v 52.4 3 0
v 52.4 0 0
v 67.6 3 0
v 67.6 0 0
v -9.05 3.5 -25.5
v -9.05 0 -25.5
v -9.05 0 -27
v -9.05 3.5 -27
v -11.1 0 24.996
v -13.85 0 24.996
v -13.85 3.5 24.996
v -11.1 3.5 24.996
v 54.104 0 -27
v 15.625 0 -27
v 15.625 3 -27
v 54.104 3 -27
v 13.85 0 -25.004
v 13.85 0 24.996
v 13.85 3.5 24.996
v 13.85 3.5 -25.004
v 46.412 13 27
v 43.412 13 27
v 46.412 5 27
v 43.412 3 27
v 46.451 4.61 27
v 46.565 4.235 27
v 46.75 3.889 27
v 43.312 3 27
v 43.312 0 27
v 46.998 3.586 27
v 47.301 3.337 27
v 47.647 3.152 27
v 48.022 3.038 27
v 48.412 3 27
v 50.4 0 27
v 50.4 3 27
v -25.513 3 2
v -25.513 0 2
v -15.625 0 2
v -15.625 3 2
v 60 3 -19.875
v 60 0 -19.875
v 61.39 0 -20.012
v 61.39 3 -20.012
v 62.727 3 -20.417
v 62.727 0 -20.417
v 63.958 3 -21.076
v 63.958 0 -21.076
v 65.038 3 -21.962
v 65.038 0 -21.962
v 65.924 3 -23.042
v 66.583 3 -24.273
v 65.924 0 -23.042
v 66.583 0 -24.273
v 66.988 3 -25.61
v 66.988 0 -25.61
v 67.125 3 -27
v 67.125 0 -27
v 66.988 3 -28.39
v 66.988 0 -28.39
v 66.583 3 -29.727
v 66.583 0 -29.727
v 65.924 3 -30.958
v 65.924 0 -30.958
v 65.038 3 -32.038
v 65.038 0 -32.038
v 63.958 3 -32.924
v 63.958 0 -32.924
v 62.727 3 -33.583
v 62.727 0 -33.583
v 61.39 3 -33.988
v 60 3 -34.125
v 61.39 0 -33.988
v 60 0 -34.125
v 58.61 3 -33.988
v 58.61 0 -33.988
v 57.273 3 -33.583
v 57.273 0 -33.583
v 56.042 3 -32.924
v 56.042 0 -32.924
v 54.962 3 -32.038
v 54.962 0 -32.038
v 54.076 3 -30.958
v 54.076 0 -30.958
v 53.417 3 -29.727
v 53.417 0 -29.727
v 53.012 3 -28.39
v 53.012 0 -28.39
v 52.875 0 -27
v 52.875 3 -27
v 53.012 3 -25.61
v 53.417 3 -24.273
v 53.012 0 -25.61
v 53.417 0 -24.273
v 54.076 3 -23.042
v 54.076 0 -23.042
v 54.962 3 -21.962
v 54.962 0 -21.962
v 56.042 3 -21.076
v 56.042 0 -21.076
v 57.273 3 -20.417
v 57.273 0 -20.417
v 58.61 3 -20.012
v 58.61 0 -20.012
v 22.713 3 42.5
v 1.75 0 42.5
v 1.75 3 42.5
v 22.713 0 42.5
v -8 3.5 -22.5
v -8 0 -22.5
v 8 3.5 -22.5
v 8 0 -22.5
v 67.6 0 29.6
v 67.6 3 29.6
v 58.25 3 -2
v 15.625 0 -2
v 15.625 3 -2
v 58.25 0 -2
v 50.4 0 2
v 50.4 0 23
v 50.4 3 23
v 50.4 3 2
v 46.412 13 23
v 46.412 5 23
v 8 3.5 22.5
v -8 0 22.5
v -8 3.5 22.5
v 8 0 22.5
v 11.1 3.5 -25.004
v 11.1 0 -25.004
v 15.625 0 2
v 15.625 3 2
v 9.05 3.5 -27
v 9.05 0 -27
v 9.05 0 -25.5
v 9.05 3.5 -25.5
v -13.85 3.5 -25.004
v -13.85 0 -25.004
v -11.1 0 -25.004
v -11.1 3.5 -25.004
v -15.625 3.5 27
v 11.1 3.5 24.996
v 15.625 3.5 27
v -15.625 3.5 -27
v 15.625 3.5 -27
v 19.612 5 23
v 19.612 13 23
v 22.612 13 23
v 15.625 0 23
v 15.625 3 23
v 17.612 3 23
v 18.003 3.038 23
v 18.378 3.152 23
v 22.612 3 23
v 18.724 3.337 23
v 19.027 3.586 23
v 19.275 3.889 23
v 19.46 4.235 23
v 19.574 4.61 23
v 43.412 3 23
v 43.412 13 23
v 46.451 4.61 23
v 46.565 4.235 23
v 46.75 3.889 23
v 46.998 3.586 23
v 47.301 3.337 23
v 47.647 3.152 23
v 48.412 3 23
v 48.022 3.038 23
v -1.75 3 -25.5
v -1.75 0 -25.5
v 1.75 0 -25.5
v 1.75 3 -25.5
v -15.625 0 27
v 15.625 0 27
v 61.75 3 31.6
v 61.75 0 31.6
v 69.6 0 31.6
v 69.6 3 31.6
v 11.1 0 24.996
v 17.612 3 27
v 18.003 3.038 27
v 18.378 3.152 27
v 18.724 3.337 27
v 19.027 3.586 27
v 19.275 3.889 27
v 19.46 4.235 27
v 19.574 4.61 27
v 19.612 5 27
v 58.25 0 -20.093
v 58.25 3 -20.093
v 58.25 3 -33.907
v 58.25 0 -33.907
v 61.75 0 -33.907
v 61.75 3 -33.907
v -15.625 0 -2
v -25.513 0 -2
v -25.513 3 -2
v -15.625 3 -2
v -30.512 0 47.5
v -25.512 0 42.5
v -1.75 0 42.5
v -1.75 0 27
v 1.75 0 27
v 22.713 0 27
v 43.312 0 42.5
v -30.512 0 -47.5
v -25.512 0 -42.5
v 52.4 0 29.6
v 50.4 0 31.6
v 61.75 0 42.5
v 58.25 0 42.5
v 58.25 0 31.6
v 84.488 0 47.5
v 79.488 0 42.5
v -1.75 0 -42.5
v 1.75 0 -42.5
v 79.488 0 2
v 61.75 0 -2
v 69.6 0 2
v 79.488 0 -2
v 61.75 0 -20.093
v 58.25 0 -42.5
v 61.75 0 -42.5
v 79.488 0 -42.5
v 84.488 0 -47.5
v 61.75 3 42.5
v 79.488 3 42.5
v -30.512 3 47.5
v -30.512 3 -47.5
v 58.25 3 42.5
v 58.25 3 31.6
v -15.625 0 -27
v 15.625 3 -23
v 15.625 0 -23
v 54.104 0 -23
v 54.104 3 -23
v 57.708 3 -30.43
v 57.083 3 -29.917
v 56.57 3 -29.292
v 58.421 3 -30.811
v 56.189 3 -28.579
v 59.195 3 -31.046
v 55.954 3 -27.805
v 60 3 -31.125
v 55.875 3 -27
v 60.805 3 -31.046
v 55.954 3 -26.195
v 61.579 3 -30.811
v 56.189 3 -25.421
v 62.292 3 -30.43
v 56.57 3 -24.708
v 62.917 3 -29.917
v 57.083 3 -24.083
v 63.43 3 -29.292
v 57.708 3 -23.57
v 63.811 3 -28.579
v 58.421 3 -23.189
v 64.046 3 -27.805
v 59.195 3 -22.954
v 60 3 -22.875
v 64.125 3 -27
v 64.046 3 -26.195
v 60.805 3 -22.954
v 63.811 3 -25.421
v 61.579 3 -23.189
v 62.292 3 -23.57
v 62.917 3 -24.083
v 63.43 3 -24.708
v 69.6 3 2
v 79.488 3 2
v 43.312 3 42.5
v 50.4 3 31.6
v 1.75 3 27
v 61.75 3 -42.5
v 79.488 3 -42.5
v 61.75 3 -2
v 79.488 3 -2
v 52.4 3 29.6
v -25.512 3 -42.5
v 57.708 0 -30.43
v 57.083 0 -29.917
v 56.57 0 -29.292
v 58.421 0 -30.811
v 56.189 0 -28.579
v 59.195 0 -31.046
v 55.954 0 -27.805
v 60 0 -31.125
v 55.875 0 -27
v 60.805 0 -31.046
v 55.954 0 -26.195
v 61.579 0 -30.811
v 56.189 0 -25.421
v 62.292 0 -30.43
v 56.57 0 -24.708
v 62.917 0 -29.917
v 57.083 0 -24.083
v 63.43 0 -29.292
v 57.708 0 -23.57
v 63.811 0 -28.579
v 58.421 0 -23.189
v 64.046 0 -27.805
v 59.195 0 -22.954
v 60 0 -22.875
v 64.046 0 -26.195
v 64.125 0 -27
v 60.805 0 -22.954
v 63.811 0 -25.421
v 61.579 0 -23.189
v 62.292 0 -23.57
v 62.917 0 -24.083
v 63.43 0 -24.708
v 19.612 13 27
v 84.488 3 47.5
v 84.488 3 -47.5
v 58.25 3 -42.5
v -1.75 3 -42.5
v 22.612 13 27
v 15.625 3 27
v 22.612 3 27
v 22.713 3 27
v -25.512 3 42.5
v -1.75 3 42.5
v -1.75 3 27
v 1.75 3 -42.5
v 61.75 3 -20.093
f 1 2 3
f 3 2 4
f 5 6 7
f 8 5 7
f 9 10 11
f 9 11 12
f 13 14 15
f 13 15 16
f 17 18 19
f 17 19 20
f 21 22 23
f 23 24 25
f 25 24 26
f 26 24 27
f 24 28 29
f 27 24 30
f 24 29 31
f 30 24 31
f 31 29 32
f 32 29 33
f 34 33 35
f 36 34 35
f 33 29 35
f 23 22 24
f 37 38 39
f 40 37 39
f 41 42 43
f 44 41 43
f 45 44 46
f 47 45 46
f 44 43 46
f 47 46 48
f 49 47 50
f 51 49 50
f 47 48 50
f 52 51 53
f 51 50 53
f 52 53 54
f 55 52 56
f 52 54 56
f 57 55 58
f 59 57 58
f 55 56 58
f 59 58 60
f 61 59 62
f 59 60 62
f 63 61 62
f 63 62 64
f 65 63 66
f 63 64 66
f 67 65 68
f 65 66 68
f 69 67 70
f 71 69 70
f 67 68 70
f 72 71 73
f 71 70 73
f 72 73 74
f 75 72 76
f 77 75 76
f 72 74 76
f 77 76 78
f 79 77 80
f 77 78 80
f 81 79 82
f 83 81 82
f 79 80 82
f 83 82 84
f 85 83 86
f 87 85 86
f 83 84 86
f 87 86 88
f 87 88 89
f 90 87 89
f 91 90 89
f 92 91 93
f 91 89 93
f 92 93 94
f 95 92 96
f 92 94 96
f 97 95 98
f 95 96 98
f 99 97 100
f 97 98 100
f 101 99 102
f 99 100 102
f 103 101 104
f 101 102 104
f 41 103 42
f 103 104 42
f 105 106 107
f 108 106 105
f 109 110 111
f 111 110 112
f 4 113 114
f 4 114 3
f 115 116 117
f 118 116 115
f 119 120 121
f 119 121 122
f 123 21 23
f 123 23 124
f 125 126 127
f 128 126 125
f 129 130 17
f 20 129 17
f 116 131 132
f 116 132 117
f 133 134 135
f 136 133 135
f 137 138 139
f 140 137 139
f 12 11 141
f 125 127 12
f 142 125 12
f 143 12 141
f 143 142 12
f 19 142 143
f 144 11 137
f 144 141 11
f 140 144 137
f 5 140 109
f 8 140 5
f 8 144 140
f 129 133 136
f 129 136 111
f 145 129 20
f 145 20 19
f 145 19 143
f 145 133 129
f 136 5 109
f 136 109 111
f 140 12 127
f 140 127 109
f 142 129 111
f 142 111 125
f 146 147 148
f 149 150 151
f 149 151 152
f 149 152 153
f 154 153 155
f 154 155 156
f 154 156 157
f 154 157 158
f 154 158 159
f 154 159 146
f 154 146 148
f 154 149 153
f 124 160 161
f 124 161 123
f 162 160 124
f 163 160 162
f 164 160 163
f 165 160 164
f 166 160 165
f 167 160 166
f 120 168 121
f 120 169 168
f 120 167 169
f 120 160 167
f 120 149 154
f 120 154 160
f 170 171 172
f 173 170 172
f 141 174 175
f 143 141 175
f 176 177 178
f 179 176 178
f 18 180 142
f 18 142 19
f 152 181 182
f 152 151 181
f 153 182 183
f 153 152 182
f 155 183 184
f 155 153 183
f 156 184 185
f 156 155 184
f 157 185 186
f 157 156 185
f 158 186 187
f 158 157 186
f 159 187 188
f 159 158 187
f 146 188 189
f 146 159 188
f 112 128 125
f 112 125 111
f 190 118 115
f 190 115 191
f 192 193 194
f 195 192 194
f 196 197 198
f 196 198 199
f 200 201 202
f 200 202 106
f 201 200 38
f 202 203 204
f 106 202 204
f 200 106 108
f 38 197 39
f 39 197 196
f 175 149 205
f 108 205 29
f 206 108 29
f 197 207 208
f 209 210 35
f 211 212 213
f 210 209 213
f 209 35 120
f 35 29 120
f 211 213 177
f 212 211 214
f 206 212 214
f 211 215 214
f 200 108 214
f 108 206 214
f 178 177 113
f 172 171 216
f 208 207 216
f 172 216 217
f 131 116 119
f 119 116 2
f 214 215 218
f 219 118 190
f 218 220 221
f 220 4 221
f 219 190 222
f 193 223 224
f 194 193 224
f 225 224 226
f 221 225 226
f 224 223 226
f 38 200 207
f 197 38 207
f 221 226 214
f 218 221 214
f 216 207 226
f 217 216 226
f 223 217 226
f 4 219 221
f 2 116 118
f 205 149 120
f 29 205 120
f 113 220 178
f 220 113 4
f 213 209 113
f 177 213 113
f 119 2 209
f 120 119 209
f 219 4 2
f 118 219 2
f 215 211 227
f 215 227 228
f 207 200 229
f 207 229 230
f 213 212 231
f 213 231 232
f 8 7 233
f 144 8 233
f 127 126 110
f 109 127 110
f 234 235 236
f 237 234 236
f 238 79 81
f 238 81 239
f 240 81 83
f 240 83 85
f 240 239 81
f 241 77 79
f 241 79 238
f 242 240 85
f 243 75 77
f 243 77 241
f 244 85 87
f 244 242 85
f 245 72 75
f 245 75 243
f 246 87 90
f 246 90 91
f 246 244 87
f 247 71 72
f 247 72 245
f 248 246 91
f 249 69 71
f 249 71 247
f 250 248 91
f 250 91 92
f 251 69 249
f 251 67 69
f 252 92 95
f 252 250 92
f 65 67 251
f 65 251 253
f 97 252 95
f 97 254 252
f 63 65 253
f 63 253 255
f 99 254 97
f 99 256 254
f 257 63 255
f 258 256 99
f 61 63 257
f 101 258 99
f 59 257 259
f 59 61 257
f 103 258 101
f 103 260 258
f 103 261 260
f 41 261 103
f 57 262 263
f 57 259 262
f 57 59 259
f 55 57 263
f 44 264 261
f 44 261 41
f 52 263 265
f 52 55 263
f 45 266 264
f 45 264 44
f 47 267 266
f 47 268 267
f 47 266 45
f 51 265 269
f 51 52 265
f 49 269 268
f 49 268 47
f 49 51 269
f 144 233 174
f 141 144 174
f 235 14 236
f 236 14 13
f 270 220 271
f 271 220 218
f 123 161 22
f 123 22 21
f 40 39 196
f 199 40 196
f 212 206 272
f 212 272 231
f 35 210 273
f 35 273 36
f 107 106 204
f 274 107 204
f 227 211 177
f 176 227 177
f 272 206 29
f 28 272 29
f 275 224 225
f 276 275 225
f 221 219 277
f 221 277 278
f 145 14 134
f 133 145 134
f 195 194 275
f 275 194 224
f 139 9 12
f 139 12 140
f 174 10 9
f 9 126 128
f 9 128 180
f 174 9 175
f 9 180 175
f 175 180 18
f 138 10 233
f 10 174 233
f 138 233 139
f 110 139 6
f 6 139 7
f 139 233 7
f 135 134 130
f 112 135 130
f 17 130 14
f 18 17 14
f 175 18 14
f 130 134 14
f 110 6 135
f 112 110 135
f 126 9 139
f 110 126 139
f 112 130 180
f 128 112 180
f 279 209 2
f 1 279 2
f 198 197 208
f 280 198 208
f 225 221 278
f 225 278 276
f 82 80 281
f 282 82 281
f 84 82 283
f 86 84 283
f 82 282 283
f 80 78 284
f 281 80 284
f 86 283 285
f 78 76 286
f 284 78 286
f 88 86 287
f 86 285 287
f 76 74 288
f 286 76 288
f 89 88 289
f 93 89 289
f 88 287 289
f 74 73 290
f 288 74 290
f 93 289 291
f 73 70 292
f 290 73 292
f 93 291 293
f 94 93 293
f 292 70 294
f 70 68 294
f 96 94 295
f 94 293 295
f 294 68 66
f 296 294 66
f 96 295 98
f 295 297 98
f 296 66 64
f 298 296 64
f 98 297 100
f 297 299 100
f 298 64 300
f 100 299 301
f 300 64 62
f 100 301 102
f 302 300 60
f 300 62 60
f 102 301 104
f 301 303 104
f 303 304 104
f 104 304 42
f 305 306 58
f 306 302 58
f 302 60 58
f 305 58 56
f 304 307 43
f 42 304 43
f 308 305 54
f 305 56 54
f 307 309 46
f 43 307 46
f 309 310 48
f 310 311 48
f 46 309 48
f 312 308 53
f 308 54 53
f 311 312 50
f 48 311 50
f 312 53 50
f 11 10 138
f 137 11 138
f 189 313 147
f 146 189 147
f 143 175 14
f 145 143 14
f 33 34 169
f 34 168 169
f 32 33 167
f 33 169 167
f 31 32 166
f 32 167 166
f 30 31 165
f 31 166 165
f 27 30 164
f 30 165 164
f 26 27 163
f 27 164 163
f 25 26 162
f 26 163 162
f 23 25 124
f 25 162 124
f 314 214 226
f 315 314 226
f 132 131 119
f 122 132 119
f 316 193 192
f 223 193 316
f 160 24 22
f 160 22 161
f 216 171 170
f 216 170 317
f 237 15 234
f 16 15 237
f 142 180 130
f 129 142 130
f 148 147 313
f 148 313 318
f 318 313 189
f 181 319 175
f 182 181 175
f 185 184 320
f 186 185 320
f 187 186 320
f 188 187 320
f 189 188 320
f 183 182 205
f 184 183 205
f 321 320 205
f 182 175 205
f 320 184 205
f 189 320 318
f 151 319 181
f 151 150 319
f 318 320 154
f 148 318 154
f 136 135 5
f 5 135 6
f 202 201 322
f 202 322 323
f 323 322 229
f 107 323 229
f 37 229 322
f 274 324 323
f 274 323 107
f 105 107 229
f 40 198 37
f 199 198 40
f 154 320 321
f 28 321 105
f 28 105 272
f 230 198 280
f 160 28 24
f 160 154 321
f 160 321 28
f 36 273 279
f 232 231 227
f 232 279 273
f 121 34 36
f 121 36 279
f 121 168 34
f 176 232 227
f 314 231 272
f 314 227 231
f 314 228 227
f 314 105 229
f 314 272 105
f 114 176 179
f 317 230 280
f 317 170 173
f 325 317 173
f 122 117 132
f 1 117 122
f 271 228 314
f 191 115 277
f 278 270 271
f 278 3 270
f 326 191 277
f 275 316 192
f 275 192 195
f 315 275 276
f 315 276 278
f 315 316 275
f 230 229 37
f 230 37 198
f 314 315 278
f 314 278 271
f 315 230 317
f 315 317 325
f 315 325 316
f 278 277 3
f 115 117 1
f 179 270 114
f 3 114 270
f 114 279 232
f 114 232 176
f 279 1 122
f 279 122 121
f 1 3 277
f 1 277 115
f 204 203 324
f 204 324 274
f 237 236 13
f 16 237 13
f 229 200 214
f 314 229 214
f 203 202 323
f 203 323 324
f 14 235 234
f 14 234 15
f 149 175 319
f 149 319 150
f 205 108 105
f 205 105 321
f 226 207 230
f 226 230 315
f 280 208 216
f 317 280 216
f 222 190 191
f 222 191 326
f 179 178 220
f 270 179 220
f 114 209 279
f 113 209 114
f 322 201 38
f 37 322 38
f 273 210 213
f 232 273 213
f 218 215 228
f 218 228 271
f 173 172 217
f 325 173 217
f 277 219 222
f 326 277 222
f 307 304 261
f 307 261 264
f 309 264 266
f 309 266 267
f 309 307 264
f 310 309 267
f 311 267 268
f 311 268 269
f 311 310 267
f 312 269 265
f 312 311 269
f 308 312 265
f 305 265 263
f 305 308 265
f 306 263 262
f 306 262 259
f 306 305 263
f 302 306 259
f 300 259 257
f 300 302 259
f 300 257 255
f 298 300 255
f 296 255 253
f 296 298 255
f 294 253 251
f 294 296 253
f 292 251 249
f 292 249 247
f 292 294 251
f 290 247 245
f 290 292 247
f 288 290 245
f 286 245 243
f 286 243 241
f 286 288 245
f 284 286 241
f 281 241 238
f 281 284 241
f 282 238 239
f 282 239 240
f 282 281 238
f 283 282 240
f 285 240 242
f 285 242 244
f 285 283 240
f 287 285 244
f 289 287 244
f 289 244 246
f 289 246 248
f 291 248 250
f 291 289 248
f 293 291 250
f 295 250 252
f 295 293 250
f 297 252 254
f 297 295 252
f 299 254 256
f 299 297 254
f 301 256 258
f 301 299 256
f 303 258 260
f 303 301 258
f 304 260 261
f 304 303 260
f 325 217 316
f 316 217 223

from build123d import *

# Parameters (mm, degrees)
SKETCH2_W           = 16
SKETCH2_H           = 45
SKETCH2_W_2         = 2.75
SKETCH2_H_2         = 50
BOSS_EXTRUDE1_DEPTH = 3.5
SKETCH3_W           = 19.2
SKETCH3_H           = 33.6
SKETCH3_W_2         = 15.2
SKETCH3_H_2         = 29.6
BOSS_EXTRUDE3_DEPTH = 3
SKETCH5_R           = 7.125
SKETCH5_R_2         = 4.125
BOSS_EXTRUDE5_DEPTH = 3
SKETCH4_W           = 115
SKETCH4_H           = 95
SKETCH4_W_2         = 110
SKETCH4_H_2         = 90
SKETCH4_W_3         = 105
SKETCH4_H_3         = 85
SKETCH4_W_4         = 3.5
SKETCH4_H_4         = 17
SKETCH4_W_5         = 9.8875
SKETCH4_H_5         = 4
SKETCH4_W_6         = 34.775
SKETCH4_H_6         = 15.5
SKETCH4_H_7         = 18.093255108
SKETCH4_H_8         = 8.593255108
SKETCH4_H_9         = 10.9
SKETCH4_W_7         = 38.478761792
SKETCH4_W_8         = 20.6
BOSS_EXTRUDE4_DEPTH = 3
SKETCH7_W           = 3
SKETCH7_H           = 4
BOSS_EXTRUDE6_DEPTH = 10
FILLET1_R           = 2
FILLET2_R           = 2


with BuildPart() as part:
    # Sketch2 → Boss-Extrude1 (new body)
    with BuildSketch(Plane(origin=(0, 0, 0), x_dir=(1, 0, 0), z_dir=(0, 1, 0))):
        Polygon((-15.625, -27), (15.625, -27), (15.625, 27), (9.05, 27), (9.05, 25.5), (-9.05, 25.5), (-9.05, 27), (-15.625, 27), align=None)
        Rectangle(SKETCH2_W, SKETCH2_H, mode=Mode.SUBTRACT)
        with Locations((12.475, 0.003539823)):
            Rectangle(SKETCH2_W_2, SKETCH2_H_2, mode=Mode.SUBTRACT)
        with Locations((-12.475, 0.003539823)):
            Rectangle(SKETCH2_W_2, SKETCH2_H_2, mode=Mode.SUBTRACT)
    extrude(amount=BOSS_EXTRUDE1_DEPTH)


with BuildPart() as body_2:
    # Sketch3 → Boss-Extrude3 (new body)
    with BuildSketch(Plane(origin=(0, 0, 0), x_dir=(1, 0, 0), z_dir=(0, 1, 0))):
        with Locations((60, -14.8)):
            Rectangle(SKETCH3_W, SKETCH3_H)
        with Locations((60, -14.8)):
            Rectangle(SKETCH3_W_2, SKETCH3_H_2, mode=Mode.SUBTRACT)
    extrude(amount=BOSS_EXTRUDE3_DEPTH)

    # Sketch4 → Boss-Extrude4 (add)
    # profile 1 of 13: a face of its own
    with BuildSketch(Plane(origin=(0, 0, 0), x_dir=(1, 0, 0), z_dir=(0, 1, 0))):
        with Locations((26.9875, 0)):
            Rectangle(SKETCH4_W, SKETCH4_H)
        with Locations((26.9875, 0)):
            Rectangle(SKETCH4_W_2, SKETCH4_H_2, mode=Mode.SUBTRACT)
    # profile 2 of 13: a face of its own
    with BuildSketch(Plane(origin=(0, 0, 0), x_dir=(1, 0, 0), z_dir=(0, 1, 0))):
        with Locations((26.9875, 0)):
            Rectangle(SKETCH4_W_2, SKETCH4_H_2)
        with Locations((26.9875, 0)):
            Rectangle(SKETCH4_W_3, SKETCH4_H_3, mode=Mode.SUBTRACT)
    # profile 3 of 13: a face of its own
    with BuildSketch(Plane(origin=(0, 0, 0), x_dir=(1, 0, 0), z_dir=(0, 1, 0))):
        with Locations((0, 34)):
            Rectangle(SKETCH4_W_4, SKETCH4_H_4)
    # profile 4 of 13: a face of its own
    with BuildSketch(Plane(origin=(0, 0, 0), x_dir=(1, 0, 0), z_dir=(0, 1, 0))):
        with Locations((-20.56875, 0)):
            Rectangle(SKETCH4_W_5, SKETCH4_H_5)
    # profile 5 of 13: a face of its own
    with BuildSketch(Plane(origin=(0, 0, 0), x_dir=(1, 0, 0), z_dir=(0, 1, 0))):
        with Locations((33.0125, 0)):
            Rectangle(SKETCH4_W_6, SKETCH4_H_5)
    # profile 6 of 13: a face of its own
    with BuildSketch(Plane(origin=(0, 0, 0), x_dir=(1, 0, 0), z_dir=(0, 1, 0))):
        with Locations((74.54375, 0)):
            Rectangle(SKETCH4_W_5, SKETCH4_H_5)
    # profile 7 of 13: a face of its own
    with BuildSketch(Plane(origin=(0, 0, 0), x_dir=(1, 0, 0), z_dir=(0, 1, 0))):
        with Locations((0, -34.75)):
            Rectangle(SKETCH4_W_4, SKETCH4_H_6)
    # profile 8 of 13: a face of its own
    with BuildSketch(Plane(origin=(0, 0, 0), x_dir=(1, 0, 0), z_dir=(0, 1, 0))):
        with Locations((60, 11.046627554)):
            Rectangle(SKETCH4_W_4, SKETCH4_H_7)
    # profile 9 of 13: a face of its own
    with BuildSketch(Plane(origin=(0, 0, 0), x_dir=(1, 0, 0), z_dir=(0, 1, 0))):
        with Locations((60, 38.203372446)):
            Rectangle(SKETCH4_W_4, SKETCH4_H_8)
    # profile 10 of 13: a face of its own
    with BuildSketch(Plane(origin=(0, 0, 0), x_dir=(1, 0, 0), z_dir=(0, 1, 0))):
        with Locations((60, -37.05)):
            Rectangle(SKETCH4_W_4, SKETCH4_H_9)
    # profile 11 of 13: a face of its own
    with BuildSketch(Plane(origin=(0, 0, 0), x_dir=(1, 0, 0), z_dir=(0, 1, 0))):
        with Locations((34.864380896, 25)):
            Rectangle(SKETCH4_W_7, SKETCH4_H_5)
    # profile 12 of 13: a face of its own
    with BuildSketch(Plane(origin=(0, 0, 0), x_dir=(1, 0, 0), z_dir=(0, 1, 0))):
        with Locations((33.0125, -25)):
            Rectangle(SKETCH4_W_6, SKETCH4_H_5)
    # profile 13 of 13: a face of its own
    with BuildSketch(Plane(origin=(0, 0, 0), x_dir=(1, 0, 0), z_dir=(0, 1, 0))):
        with Locations((33.0125, -34.75)):
            Rectangle(SKETCH4_W_8, SKETCH4_H_6)
    extrude(amount=BOSS_EXTRUDE4_DEPTH)


with BuildPart() as body_3:
    # Sketch5 → Boss-Extrude5 (new body)
    with BuildSketch(Plane(origin=(0, 0, 0), x_dir=(1, 0, 0), z_dir=(0, 1, 0))):
        with Locations(Location((60, 27, 0), (0, 0, 270))):
            Circle(SKETCH5_R)
        with Locations(Location((60, 27, 0), (0, 0, 270))):
            Circle(SKETCH5_R_2, mode=Mode.SUBTRACT)
    extrude(amount=BOSS_EXTRUDE5_DEPTH)


with BuildPart() as boss_extrude4_piece_1:
    # of the separate pieces the step leaves, piece 1, a body of its own (boss_extrude4_pieces)
    add(body_2.part.solids().sort_by_distance((58.25, 0, -2))[0])

    # Sketch7 → Boss-Extrude6 (add)
    with BuildSketch(Plane(origin=(0, 3, 0), x_dir=(1, 0, 0), z_dir=(0, 1, 0))):
        with Locations((21.1125, -25)):
            Rectangle(SKETCH7_W, SKETCH7_H)
        with Locations((44.9125, -25)):
            Rectangle(SKETCH7_W, SKETCH7_H)
    extrude(amount=BOSS_EXTRUDE6_DEPTH)

    # Fillet1
    fillet1_edges = [boss_extrude4_piece_1.edges().sort_by_distance(p)[0] for p in [
        (19.6125, 3, 25),
    ]]
    fillet(fillet1_edges, radius=FILLET1_R)

    # Fillet2
    fillet2_edges = [boss_extrude4_piece_1.edges().sort_by_distance(p)[0] for p in [
        (46.4125, 3, 25),
    ]]
    fillet(fillet2_edges, radius=FILLET2_R)


with BuildPart() as boss_extrude4_piece_2:
    # of the separate pieces the step leaves, piece 2, a body of its own (boss_extrude4_pieces)
    add(body_2.part.solids().sort_by_distance((54.103761792, 0, -27))[0])


solid = Compound([part.part, body_3.part, boss_extrude4_piece_1.part, boss_extrude4_piece_2.part])
